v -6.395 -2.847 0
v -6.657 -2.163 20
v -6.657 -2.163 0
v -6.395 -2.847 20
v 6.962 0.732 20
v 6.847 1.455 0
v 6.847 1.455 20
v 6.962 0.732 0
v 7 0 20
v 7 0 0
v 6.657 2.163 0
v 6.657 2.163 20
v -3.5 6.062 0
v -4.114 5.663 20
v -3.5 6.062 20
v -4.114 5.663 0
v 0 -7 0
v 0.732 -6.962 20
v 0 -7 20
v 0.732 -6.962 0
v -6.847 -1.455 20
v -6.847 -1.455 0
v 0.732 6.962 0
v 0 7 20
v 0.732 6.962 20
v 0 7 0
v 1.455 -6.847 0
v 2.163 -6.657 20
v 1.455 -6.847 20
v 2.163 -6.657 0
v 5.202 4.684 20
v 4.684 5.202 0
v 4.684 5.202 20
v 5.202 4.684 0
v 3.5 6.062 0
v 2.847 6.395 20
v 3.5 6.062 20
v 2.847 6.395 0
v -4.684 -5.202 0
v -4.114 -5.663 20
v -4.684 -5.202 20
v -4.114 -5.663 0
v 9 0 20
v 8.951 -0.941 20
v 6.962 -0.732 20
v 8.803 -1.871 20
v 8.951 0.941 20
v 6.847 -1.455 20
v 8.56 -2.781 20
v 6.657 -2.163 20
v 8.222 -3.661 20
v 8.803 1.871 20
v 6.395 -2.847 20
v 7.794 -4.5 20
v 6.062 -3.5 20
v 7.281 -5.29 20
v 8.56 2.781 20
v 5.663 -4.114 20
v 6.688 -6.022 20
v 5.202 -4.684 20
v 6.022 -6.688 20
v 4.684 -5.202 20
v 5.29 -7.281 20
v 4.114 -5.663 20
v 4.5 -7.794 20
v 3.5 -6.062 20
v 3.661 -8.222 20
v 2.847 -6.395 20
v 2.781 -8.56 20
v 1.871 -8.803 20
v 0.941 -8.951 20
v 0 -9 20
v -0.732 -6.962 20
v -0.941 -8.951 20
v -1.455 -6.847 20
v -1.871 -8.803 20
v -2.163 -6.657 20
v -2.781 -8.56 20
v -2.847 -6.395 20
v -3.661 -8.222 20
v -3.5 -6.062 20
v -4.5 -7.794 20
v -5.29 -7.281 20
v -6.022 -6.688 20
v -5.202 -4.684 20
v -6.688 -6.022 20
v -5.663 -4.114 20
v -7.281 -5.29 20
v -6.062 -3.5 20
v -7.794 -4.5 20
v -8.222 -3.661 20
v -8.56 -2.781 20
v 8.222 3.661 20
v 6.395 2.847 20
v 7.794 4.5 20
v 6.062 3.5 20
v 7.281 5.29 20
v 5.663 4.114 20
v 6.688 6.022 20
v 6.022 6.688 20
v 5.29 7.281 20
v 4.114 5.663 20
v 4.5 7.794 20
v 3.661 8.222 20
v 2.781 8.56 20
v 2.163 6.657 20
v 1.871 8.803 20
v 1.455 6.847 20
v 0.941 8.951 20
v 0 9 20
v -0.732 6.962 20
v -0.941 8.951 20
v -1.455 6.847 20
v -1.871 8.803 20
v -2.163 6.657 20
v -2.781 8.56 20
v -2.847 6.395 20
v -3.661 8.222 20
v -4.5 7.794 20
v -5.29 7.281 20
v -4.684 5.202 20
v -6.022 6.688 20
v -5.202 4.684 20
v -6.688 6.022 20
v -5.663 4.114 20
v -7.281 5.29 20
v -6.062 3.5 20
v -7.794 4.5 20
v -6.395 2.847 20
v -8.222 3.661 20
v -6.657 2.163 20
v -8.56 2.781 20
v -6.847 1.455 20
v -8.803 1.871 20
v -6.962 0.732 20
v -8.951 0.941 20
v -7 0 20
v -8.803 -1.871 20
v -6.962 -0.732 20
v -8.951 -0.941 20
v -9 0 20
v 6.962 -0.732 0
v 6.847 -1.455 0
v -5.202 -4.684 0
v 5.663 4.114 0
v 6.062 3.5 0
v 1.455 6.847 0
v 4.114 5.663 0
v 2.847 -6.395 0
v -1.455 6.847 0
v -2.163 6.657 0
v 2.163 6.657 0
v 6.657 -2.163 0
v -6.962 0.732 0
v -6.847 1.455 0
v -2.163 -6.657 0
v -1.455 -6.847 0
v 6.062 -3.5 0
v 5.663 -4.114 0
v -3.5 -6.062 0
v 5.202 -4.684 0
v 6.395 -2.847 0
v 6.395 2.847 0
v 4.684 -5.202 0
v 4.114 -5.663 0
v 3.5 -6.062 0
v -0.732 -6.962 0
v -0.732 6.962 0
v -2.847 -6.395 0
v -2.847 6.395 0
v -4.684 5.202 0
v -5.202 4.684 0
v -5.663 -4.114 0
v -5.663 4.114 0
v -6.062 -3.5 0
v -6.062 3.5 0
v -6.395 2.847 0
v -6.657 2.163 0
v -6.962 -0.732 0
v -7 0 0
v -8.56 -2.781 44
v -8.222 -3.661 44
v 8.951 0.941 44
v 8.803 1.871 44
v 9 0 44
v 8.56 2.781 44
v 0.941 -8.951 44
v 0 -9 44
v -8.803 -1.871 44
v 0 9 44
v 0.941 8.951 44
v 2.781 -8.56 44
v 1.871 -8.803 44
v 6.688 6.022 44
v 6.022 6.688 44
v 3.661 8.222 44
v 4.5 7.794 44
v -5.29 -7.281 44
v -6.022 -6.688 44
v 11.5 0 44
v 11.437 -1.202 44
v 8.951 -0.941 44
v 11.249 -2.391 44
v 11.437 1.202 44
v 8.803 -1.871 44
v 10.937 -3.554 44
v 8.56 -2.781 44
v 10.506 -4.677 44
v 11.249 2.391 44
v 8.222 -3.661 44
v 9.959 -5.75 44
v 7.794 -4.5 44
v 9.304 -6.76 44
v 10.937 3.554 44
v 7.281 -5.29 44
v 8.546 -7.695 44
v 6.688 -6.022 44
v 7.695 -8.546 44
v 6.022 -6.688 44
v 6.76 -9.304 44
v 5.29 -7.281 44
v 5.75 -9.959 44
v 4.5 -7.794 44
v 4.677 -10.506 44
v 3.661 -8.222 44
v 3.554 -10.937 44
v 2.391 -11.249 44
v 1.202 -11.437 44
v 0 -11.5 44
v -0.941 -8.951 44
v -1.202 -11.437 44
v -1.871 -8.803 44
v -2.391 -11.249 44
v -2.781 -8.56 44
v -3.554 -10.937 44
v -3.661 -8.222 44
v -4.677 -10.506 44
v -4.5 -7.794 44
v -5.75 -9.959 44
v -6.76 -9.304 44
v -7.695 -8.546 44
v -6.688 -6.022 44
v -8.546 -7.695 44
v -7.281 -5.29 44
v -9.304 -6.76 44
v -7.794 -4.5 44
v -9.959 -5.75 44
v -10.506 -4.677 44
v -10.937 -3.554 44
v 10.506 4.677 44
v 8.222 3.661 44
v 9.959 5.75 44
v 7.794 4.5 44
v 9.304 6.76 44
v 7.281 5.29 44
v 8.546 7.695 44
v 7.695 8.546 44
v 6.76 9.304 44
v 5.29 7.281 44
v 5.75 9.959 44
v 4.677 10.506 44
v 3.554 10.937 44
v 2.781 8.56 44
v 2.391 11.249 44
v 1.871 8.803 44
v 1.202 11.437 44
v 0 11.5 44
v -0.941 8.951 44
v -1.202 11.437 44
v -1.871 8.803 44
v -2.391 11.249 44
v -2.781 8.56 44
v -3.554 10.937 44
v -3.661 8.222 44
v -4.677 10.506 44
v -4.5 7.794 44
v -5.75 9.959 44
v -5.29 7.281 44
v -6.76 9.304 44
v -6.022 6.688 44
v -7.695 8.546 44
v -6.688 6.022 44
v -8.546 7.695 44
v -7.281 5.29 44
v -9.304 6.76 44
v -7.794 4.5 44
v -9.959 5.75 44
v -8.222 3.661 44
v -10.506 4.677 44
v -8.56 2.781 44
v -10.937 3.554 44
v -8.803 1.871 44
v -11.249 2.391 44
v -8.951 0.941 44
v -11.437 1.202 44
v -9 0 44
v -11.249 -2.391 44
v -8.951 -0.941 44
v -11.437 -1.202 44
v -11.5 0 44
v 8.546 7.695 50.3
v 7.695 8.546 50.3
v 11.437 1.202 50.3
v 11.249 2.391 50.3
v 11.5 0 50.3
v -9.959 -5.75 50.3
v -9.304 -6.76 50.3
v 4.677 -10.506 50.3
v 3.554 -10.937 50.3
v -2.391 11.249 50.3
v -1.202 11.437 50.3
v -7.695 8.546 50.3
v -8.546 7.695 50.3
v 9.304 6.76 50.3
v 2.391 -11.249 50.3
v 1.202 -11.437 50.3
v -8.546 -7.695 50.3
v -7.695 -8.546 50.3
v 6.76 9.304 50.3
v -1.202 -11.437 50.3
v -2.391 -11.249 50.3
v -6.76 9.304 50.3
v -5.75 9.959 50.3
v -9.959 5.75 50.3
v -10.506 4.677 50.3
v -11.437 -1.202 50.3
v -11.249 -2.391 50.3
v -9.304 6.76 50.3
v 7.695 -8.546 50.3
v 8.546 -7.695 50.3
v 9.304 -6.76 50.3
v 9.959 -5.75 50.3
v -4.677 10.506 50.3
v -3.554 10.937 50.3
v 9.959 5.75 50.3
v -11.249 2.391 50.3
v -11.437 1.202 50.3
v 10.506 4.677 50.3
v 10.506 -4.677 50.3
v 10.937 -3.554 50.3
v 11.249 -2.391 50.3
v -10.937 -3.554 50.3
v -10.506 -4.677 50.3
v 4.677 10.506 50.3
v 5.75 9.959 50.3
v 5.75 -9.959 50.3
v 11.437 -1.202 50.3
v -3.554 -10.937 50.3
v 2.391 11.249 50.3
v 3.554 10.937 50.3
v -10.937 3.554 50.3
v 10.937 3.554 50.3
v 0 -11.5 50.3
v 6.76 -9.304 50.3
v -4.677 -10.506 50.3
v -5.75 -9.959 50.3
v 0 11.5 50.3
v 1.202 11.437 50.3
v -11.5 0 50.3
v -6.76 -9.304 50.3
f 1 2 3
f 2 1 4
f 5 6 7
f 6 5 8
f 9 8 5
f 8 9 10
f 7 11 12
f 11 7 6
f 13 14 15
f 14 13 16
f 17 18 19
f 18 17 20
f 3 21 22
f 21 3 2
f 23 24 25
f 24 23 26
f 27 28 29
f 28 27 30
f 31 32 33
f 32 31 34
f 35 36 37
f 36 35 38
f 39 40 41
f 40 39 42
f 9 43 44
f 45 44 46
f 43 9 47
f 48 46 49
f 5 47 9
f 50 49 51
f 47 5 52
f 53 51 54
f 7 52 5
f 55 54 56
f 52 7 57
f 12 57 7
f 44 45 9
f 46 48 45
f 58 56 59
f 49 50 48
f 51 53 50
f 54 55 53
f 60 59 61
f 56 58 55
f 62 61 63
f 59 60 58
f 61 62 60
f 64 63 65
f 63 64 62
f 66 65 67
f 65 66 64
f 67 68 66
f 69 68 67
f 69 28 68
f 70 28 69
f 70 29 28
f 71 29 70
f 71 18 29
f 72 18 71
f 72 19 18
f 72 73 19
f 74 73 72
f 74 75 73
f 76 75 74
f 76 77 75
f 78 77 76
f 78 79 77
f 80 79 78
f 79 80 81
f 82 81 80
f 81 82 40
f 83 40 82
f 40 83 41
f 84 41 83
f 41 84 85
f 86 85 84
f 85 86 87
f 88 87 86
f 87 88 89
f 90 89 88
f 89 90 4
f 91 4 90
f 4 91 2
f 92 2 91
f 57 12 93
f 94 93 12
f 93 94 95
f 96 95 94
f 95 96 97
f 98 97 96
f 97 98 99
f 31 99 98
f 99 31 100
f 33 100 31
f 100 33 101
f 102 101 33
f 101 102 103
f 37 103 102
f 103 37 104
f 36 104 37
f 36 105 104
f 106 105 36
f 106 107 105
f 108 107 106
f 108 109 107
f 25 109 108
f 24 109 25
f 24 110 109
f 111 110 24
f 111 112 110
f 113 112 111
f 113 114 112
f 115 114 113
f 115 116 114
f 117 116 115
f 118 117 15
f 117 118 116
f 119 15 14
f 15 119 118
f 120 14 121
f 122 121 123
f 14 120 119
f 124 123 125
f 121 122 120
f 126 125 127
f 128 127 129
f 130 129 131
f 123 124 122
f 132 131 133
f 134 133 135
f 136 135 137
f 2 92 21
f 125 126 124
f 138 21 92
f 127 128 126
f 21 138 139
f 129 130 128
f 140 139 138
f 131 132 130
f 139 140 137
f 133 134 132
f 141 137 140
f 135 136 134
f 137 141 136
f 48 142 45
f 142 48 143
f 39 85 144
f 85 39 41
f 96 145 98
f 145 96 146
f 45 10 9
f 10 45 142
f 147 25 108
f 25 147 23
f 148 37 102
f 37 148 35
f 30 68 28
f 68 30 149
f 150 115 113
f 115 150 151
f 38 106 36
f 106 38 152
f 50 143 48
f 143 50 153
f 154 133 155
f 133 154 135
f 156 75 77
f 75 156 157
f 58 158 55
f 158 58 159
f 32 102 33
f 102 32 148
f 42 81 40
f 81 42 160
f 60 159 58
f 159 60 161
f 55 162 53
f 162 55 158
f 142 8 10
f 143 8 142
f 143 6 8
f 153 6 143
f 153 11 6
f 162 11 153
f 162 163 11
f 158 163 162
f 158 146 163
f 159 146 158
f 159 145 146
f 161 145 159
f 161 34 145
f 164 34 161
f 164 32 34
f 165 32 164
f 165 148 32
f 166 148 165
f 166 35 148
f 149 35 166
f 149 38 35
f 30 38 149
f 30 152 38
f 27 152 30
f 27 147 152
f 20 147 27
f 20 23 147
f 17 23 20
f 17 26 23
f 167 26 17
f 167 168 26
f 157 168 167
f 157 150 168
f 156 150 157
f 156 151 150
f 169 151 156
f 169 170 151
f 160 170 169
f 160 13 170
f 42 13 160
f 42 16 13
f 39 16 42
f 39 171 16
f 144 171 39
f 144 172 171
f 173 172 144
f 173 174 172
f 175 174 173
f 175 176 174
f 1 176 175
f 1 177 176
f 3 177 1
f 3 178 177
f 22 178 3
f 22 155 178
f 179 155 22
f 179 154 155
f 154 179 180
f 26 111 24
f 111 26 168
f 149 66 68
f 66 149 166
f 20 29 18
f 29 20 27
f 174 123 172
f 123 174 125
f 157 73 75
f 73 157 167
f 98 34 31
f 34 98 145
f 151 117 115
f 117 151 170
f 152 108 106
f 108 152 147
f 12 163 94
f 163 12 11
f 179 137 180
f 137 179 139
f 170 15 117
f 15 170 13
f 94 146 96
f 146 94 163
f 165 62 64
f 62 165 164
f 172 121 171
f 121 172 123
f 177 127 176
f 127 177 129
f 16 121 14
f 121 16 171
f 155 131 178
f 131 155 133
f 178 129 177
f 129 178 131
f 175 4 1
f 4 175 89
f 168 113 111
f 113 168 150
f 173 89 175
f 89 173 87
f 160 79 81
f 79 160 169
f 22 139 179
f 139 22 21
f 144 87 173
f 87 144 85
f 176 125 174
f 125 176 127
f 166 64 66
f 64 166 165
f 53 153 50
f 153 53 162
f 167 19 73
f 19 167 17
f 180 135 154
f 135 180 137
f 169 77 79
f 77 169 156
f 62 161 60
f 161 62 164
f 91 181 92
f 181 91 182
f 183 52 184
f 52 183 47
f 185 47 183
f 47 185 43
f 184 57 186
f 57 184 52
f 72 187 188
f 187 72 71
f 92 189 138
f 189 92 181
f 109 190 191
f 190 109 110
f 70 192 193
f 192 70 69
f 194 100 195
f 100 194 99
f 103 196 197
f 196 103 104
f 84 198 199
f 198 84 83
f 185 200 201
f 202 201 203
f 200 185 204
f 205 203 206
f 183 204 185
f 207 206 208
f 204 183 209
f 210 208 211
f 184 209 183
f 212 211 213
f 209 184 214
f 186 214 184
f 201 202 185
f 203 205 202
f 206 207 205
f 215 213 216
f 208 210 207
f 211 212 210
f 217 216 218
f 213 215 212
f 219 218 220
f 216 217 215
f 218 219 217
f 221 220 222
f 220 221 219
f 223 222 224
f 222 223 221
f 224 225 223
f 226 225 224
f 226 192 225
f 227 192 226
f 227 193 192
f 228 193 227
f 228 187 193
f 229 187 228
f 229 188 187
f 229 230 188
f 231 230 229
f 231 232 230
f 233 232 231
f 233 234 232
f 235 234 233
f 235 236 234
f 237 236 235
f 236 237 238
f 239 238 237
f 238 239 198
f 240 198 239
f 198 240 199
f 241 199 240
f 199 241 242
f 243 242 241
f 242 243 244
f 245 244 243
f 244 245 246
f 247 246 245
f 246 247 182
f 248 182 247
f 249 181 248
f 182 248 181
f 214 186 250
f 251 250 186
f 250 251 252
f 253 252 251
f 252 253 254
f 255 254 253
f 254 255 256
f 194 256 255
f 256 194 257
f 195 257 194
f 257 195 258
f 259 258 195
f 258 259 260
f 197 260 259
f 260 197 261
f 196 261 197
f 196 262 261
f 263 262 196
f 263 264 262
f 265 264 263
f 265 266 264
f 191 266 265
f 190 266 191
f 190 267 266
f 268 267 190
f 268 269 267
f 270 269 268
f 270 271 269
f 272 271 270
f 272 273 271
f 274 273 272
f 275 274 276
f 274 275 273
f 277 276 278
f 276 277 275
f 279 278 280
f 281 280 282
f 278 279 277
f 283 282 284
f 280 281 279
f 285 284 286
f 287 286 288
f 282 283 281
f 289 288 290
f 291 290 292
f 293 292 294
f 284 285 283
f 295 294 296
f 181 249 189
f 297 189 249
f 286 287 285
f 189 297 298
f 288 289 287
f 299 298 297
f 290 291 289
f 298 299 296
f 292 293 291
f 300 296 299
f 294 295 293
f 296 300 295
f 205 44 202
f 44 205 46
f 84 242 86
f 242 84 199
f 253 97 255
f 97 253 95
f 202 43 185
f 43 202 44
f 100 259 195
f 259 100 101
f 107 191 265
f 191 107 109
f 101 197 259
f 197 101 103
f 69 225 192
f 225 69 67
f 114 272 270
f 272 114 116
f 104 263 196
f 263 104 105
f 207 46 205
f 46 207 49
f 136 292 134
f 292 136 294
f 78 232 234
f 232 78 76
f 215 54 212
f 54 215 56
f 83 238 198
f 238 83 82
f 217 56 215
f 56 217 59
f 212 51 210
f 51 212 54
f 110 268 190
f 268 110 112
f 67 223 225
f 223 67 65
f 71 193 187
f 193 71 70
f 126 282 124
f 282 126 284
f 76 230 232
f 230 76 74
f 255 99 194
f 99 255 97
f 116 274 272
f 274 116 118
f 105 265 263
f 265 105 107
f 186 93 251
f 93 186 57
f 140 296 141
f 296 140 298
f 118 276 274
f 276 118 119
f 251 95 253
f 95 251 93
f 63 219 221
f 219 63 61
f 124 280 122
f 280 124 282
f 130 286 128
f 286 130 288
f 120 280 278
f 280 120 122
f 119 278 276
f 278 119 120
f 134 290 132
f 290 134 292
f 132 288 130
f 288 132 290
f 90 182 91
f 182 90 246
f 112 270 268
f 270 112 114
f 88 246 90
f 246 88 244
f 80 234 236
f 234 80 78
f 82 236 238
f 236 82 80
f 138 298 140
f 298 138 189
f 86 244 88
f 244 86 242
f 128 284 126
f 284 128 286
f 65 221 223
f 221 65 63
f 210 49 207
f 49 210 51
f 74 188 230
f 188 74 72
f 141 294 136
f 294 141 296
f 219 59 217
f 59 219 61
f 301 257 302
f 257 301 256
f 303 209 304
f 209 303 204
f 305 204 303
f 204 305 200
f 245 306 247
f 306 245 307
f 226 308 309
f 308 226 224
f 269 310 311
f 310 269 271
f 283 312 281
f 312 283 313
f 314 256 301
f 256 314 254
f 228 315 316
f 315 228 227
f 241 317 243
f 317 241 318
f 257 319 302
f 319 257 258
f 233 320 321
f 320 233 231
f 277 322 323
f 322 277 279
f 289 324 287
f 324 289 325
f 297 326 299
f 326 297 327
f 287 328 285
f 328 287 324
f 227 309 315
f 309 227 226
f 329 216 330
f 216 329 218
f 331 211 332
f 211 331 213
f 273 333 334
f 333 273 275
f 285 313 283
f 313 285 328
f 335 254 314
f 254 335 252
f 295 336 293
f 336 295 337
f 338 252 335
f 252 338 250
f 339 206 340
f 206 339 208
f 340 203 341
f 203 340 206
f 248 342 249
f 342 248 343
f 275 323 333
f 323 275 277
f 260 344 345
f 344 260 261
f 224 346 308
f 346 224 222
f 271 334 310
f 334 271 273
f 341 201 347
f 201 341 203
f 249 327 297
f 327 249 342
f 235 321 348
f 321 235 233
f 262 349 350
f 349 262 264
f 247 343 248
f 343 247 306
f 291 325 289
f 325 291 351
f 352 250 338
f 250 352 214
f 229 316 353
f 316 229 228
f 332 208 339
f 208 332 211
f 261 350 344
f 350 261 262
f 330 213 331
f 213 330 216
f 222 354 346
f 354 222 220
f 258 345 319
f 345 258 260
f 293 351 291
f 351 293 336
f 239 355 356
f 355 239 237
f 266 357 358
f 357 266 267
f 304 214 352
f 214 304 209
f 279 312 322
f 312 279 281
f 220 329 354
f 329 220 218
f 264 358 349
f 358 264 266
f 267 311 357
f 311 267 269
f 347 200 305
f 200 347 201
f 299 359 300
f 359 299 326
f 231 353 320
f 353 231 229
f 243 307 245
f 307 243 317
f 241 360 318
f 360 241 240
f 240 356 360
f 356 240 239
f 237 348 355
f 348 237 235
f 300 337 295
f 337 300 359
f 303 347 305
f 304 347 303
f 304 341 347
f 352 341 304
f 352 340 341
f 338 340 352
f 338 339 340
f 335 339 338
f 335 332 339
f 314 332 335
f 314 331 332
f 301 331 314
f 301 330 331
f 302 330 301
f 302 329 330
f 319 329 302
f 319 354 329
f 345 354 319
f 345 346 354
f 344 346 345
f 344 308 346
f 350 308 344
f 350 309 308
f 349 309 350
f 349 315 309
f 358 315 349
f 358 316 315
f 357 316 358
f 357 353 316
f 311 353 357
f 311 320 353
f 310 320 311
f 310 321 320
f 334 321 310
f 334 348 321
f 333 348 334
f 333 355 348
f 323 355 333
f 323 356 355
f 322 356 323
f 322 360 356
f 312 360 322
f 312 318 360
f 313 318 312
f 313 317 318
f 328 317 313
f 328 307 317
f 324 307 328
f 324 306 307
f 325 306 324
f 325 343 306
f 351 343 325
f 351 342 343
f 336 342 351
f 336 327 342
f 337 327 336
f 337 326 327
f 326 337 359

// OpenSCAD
// Shoulder bolt.
$fn = 60;
eps = 0.02;
thread_d = 14;
shoulder_d = 18;
shoulder_l = 24;
thread_l = 20;
head_d = shoulder_d + 5;
union() {
    cylinder(d=thread_d,h=thread_l);
    translate([0,0,thread_l]) cylinder(d=shoulder_d,h=shoulder_l);
    translate([0,0,thread_l+shoulder_l]) cylinder(d=head_d,h=shoulder_d*0.35);
}
